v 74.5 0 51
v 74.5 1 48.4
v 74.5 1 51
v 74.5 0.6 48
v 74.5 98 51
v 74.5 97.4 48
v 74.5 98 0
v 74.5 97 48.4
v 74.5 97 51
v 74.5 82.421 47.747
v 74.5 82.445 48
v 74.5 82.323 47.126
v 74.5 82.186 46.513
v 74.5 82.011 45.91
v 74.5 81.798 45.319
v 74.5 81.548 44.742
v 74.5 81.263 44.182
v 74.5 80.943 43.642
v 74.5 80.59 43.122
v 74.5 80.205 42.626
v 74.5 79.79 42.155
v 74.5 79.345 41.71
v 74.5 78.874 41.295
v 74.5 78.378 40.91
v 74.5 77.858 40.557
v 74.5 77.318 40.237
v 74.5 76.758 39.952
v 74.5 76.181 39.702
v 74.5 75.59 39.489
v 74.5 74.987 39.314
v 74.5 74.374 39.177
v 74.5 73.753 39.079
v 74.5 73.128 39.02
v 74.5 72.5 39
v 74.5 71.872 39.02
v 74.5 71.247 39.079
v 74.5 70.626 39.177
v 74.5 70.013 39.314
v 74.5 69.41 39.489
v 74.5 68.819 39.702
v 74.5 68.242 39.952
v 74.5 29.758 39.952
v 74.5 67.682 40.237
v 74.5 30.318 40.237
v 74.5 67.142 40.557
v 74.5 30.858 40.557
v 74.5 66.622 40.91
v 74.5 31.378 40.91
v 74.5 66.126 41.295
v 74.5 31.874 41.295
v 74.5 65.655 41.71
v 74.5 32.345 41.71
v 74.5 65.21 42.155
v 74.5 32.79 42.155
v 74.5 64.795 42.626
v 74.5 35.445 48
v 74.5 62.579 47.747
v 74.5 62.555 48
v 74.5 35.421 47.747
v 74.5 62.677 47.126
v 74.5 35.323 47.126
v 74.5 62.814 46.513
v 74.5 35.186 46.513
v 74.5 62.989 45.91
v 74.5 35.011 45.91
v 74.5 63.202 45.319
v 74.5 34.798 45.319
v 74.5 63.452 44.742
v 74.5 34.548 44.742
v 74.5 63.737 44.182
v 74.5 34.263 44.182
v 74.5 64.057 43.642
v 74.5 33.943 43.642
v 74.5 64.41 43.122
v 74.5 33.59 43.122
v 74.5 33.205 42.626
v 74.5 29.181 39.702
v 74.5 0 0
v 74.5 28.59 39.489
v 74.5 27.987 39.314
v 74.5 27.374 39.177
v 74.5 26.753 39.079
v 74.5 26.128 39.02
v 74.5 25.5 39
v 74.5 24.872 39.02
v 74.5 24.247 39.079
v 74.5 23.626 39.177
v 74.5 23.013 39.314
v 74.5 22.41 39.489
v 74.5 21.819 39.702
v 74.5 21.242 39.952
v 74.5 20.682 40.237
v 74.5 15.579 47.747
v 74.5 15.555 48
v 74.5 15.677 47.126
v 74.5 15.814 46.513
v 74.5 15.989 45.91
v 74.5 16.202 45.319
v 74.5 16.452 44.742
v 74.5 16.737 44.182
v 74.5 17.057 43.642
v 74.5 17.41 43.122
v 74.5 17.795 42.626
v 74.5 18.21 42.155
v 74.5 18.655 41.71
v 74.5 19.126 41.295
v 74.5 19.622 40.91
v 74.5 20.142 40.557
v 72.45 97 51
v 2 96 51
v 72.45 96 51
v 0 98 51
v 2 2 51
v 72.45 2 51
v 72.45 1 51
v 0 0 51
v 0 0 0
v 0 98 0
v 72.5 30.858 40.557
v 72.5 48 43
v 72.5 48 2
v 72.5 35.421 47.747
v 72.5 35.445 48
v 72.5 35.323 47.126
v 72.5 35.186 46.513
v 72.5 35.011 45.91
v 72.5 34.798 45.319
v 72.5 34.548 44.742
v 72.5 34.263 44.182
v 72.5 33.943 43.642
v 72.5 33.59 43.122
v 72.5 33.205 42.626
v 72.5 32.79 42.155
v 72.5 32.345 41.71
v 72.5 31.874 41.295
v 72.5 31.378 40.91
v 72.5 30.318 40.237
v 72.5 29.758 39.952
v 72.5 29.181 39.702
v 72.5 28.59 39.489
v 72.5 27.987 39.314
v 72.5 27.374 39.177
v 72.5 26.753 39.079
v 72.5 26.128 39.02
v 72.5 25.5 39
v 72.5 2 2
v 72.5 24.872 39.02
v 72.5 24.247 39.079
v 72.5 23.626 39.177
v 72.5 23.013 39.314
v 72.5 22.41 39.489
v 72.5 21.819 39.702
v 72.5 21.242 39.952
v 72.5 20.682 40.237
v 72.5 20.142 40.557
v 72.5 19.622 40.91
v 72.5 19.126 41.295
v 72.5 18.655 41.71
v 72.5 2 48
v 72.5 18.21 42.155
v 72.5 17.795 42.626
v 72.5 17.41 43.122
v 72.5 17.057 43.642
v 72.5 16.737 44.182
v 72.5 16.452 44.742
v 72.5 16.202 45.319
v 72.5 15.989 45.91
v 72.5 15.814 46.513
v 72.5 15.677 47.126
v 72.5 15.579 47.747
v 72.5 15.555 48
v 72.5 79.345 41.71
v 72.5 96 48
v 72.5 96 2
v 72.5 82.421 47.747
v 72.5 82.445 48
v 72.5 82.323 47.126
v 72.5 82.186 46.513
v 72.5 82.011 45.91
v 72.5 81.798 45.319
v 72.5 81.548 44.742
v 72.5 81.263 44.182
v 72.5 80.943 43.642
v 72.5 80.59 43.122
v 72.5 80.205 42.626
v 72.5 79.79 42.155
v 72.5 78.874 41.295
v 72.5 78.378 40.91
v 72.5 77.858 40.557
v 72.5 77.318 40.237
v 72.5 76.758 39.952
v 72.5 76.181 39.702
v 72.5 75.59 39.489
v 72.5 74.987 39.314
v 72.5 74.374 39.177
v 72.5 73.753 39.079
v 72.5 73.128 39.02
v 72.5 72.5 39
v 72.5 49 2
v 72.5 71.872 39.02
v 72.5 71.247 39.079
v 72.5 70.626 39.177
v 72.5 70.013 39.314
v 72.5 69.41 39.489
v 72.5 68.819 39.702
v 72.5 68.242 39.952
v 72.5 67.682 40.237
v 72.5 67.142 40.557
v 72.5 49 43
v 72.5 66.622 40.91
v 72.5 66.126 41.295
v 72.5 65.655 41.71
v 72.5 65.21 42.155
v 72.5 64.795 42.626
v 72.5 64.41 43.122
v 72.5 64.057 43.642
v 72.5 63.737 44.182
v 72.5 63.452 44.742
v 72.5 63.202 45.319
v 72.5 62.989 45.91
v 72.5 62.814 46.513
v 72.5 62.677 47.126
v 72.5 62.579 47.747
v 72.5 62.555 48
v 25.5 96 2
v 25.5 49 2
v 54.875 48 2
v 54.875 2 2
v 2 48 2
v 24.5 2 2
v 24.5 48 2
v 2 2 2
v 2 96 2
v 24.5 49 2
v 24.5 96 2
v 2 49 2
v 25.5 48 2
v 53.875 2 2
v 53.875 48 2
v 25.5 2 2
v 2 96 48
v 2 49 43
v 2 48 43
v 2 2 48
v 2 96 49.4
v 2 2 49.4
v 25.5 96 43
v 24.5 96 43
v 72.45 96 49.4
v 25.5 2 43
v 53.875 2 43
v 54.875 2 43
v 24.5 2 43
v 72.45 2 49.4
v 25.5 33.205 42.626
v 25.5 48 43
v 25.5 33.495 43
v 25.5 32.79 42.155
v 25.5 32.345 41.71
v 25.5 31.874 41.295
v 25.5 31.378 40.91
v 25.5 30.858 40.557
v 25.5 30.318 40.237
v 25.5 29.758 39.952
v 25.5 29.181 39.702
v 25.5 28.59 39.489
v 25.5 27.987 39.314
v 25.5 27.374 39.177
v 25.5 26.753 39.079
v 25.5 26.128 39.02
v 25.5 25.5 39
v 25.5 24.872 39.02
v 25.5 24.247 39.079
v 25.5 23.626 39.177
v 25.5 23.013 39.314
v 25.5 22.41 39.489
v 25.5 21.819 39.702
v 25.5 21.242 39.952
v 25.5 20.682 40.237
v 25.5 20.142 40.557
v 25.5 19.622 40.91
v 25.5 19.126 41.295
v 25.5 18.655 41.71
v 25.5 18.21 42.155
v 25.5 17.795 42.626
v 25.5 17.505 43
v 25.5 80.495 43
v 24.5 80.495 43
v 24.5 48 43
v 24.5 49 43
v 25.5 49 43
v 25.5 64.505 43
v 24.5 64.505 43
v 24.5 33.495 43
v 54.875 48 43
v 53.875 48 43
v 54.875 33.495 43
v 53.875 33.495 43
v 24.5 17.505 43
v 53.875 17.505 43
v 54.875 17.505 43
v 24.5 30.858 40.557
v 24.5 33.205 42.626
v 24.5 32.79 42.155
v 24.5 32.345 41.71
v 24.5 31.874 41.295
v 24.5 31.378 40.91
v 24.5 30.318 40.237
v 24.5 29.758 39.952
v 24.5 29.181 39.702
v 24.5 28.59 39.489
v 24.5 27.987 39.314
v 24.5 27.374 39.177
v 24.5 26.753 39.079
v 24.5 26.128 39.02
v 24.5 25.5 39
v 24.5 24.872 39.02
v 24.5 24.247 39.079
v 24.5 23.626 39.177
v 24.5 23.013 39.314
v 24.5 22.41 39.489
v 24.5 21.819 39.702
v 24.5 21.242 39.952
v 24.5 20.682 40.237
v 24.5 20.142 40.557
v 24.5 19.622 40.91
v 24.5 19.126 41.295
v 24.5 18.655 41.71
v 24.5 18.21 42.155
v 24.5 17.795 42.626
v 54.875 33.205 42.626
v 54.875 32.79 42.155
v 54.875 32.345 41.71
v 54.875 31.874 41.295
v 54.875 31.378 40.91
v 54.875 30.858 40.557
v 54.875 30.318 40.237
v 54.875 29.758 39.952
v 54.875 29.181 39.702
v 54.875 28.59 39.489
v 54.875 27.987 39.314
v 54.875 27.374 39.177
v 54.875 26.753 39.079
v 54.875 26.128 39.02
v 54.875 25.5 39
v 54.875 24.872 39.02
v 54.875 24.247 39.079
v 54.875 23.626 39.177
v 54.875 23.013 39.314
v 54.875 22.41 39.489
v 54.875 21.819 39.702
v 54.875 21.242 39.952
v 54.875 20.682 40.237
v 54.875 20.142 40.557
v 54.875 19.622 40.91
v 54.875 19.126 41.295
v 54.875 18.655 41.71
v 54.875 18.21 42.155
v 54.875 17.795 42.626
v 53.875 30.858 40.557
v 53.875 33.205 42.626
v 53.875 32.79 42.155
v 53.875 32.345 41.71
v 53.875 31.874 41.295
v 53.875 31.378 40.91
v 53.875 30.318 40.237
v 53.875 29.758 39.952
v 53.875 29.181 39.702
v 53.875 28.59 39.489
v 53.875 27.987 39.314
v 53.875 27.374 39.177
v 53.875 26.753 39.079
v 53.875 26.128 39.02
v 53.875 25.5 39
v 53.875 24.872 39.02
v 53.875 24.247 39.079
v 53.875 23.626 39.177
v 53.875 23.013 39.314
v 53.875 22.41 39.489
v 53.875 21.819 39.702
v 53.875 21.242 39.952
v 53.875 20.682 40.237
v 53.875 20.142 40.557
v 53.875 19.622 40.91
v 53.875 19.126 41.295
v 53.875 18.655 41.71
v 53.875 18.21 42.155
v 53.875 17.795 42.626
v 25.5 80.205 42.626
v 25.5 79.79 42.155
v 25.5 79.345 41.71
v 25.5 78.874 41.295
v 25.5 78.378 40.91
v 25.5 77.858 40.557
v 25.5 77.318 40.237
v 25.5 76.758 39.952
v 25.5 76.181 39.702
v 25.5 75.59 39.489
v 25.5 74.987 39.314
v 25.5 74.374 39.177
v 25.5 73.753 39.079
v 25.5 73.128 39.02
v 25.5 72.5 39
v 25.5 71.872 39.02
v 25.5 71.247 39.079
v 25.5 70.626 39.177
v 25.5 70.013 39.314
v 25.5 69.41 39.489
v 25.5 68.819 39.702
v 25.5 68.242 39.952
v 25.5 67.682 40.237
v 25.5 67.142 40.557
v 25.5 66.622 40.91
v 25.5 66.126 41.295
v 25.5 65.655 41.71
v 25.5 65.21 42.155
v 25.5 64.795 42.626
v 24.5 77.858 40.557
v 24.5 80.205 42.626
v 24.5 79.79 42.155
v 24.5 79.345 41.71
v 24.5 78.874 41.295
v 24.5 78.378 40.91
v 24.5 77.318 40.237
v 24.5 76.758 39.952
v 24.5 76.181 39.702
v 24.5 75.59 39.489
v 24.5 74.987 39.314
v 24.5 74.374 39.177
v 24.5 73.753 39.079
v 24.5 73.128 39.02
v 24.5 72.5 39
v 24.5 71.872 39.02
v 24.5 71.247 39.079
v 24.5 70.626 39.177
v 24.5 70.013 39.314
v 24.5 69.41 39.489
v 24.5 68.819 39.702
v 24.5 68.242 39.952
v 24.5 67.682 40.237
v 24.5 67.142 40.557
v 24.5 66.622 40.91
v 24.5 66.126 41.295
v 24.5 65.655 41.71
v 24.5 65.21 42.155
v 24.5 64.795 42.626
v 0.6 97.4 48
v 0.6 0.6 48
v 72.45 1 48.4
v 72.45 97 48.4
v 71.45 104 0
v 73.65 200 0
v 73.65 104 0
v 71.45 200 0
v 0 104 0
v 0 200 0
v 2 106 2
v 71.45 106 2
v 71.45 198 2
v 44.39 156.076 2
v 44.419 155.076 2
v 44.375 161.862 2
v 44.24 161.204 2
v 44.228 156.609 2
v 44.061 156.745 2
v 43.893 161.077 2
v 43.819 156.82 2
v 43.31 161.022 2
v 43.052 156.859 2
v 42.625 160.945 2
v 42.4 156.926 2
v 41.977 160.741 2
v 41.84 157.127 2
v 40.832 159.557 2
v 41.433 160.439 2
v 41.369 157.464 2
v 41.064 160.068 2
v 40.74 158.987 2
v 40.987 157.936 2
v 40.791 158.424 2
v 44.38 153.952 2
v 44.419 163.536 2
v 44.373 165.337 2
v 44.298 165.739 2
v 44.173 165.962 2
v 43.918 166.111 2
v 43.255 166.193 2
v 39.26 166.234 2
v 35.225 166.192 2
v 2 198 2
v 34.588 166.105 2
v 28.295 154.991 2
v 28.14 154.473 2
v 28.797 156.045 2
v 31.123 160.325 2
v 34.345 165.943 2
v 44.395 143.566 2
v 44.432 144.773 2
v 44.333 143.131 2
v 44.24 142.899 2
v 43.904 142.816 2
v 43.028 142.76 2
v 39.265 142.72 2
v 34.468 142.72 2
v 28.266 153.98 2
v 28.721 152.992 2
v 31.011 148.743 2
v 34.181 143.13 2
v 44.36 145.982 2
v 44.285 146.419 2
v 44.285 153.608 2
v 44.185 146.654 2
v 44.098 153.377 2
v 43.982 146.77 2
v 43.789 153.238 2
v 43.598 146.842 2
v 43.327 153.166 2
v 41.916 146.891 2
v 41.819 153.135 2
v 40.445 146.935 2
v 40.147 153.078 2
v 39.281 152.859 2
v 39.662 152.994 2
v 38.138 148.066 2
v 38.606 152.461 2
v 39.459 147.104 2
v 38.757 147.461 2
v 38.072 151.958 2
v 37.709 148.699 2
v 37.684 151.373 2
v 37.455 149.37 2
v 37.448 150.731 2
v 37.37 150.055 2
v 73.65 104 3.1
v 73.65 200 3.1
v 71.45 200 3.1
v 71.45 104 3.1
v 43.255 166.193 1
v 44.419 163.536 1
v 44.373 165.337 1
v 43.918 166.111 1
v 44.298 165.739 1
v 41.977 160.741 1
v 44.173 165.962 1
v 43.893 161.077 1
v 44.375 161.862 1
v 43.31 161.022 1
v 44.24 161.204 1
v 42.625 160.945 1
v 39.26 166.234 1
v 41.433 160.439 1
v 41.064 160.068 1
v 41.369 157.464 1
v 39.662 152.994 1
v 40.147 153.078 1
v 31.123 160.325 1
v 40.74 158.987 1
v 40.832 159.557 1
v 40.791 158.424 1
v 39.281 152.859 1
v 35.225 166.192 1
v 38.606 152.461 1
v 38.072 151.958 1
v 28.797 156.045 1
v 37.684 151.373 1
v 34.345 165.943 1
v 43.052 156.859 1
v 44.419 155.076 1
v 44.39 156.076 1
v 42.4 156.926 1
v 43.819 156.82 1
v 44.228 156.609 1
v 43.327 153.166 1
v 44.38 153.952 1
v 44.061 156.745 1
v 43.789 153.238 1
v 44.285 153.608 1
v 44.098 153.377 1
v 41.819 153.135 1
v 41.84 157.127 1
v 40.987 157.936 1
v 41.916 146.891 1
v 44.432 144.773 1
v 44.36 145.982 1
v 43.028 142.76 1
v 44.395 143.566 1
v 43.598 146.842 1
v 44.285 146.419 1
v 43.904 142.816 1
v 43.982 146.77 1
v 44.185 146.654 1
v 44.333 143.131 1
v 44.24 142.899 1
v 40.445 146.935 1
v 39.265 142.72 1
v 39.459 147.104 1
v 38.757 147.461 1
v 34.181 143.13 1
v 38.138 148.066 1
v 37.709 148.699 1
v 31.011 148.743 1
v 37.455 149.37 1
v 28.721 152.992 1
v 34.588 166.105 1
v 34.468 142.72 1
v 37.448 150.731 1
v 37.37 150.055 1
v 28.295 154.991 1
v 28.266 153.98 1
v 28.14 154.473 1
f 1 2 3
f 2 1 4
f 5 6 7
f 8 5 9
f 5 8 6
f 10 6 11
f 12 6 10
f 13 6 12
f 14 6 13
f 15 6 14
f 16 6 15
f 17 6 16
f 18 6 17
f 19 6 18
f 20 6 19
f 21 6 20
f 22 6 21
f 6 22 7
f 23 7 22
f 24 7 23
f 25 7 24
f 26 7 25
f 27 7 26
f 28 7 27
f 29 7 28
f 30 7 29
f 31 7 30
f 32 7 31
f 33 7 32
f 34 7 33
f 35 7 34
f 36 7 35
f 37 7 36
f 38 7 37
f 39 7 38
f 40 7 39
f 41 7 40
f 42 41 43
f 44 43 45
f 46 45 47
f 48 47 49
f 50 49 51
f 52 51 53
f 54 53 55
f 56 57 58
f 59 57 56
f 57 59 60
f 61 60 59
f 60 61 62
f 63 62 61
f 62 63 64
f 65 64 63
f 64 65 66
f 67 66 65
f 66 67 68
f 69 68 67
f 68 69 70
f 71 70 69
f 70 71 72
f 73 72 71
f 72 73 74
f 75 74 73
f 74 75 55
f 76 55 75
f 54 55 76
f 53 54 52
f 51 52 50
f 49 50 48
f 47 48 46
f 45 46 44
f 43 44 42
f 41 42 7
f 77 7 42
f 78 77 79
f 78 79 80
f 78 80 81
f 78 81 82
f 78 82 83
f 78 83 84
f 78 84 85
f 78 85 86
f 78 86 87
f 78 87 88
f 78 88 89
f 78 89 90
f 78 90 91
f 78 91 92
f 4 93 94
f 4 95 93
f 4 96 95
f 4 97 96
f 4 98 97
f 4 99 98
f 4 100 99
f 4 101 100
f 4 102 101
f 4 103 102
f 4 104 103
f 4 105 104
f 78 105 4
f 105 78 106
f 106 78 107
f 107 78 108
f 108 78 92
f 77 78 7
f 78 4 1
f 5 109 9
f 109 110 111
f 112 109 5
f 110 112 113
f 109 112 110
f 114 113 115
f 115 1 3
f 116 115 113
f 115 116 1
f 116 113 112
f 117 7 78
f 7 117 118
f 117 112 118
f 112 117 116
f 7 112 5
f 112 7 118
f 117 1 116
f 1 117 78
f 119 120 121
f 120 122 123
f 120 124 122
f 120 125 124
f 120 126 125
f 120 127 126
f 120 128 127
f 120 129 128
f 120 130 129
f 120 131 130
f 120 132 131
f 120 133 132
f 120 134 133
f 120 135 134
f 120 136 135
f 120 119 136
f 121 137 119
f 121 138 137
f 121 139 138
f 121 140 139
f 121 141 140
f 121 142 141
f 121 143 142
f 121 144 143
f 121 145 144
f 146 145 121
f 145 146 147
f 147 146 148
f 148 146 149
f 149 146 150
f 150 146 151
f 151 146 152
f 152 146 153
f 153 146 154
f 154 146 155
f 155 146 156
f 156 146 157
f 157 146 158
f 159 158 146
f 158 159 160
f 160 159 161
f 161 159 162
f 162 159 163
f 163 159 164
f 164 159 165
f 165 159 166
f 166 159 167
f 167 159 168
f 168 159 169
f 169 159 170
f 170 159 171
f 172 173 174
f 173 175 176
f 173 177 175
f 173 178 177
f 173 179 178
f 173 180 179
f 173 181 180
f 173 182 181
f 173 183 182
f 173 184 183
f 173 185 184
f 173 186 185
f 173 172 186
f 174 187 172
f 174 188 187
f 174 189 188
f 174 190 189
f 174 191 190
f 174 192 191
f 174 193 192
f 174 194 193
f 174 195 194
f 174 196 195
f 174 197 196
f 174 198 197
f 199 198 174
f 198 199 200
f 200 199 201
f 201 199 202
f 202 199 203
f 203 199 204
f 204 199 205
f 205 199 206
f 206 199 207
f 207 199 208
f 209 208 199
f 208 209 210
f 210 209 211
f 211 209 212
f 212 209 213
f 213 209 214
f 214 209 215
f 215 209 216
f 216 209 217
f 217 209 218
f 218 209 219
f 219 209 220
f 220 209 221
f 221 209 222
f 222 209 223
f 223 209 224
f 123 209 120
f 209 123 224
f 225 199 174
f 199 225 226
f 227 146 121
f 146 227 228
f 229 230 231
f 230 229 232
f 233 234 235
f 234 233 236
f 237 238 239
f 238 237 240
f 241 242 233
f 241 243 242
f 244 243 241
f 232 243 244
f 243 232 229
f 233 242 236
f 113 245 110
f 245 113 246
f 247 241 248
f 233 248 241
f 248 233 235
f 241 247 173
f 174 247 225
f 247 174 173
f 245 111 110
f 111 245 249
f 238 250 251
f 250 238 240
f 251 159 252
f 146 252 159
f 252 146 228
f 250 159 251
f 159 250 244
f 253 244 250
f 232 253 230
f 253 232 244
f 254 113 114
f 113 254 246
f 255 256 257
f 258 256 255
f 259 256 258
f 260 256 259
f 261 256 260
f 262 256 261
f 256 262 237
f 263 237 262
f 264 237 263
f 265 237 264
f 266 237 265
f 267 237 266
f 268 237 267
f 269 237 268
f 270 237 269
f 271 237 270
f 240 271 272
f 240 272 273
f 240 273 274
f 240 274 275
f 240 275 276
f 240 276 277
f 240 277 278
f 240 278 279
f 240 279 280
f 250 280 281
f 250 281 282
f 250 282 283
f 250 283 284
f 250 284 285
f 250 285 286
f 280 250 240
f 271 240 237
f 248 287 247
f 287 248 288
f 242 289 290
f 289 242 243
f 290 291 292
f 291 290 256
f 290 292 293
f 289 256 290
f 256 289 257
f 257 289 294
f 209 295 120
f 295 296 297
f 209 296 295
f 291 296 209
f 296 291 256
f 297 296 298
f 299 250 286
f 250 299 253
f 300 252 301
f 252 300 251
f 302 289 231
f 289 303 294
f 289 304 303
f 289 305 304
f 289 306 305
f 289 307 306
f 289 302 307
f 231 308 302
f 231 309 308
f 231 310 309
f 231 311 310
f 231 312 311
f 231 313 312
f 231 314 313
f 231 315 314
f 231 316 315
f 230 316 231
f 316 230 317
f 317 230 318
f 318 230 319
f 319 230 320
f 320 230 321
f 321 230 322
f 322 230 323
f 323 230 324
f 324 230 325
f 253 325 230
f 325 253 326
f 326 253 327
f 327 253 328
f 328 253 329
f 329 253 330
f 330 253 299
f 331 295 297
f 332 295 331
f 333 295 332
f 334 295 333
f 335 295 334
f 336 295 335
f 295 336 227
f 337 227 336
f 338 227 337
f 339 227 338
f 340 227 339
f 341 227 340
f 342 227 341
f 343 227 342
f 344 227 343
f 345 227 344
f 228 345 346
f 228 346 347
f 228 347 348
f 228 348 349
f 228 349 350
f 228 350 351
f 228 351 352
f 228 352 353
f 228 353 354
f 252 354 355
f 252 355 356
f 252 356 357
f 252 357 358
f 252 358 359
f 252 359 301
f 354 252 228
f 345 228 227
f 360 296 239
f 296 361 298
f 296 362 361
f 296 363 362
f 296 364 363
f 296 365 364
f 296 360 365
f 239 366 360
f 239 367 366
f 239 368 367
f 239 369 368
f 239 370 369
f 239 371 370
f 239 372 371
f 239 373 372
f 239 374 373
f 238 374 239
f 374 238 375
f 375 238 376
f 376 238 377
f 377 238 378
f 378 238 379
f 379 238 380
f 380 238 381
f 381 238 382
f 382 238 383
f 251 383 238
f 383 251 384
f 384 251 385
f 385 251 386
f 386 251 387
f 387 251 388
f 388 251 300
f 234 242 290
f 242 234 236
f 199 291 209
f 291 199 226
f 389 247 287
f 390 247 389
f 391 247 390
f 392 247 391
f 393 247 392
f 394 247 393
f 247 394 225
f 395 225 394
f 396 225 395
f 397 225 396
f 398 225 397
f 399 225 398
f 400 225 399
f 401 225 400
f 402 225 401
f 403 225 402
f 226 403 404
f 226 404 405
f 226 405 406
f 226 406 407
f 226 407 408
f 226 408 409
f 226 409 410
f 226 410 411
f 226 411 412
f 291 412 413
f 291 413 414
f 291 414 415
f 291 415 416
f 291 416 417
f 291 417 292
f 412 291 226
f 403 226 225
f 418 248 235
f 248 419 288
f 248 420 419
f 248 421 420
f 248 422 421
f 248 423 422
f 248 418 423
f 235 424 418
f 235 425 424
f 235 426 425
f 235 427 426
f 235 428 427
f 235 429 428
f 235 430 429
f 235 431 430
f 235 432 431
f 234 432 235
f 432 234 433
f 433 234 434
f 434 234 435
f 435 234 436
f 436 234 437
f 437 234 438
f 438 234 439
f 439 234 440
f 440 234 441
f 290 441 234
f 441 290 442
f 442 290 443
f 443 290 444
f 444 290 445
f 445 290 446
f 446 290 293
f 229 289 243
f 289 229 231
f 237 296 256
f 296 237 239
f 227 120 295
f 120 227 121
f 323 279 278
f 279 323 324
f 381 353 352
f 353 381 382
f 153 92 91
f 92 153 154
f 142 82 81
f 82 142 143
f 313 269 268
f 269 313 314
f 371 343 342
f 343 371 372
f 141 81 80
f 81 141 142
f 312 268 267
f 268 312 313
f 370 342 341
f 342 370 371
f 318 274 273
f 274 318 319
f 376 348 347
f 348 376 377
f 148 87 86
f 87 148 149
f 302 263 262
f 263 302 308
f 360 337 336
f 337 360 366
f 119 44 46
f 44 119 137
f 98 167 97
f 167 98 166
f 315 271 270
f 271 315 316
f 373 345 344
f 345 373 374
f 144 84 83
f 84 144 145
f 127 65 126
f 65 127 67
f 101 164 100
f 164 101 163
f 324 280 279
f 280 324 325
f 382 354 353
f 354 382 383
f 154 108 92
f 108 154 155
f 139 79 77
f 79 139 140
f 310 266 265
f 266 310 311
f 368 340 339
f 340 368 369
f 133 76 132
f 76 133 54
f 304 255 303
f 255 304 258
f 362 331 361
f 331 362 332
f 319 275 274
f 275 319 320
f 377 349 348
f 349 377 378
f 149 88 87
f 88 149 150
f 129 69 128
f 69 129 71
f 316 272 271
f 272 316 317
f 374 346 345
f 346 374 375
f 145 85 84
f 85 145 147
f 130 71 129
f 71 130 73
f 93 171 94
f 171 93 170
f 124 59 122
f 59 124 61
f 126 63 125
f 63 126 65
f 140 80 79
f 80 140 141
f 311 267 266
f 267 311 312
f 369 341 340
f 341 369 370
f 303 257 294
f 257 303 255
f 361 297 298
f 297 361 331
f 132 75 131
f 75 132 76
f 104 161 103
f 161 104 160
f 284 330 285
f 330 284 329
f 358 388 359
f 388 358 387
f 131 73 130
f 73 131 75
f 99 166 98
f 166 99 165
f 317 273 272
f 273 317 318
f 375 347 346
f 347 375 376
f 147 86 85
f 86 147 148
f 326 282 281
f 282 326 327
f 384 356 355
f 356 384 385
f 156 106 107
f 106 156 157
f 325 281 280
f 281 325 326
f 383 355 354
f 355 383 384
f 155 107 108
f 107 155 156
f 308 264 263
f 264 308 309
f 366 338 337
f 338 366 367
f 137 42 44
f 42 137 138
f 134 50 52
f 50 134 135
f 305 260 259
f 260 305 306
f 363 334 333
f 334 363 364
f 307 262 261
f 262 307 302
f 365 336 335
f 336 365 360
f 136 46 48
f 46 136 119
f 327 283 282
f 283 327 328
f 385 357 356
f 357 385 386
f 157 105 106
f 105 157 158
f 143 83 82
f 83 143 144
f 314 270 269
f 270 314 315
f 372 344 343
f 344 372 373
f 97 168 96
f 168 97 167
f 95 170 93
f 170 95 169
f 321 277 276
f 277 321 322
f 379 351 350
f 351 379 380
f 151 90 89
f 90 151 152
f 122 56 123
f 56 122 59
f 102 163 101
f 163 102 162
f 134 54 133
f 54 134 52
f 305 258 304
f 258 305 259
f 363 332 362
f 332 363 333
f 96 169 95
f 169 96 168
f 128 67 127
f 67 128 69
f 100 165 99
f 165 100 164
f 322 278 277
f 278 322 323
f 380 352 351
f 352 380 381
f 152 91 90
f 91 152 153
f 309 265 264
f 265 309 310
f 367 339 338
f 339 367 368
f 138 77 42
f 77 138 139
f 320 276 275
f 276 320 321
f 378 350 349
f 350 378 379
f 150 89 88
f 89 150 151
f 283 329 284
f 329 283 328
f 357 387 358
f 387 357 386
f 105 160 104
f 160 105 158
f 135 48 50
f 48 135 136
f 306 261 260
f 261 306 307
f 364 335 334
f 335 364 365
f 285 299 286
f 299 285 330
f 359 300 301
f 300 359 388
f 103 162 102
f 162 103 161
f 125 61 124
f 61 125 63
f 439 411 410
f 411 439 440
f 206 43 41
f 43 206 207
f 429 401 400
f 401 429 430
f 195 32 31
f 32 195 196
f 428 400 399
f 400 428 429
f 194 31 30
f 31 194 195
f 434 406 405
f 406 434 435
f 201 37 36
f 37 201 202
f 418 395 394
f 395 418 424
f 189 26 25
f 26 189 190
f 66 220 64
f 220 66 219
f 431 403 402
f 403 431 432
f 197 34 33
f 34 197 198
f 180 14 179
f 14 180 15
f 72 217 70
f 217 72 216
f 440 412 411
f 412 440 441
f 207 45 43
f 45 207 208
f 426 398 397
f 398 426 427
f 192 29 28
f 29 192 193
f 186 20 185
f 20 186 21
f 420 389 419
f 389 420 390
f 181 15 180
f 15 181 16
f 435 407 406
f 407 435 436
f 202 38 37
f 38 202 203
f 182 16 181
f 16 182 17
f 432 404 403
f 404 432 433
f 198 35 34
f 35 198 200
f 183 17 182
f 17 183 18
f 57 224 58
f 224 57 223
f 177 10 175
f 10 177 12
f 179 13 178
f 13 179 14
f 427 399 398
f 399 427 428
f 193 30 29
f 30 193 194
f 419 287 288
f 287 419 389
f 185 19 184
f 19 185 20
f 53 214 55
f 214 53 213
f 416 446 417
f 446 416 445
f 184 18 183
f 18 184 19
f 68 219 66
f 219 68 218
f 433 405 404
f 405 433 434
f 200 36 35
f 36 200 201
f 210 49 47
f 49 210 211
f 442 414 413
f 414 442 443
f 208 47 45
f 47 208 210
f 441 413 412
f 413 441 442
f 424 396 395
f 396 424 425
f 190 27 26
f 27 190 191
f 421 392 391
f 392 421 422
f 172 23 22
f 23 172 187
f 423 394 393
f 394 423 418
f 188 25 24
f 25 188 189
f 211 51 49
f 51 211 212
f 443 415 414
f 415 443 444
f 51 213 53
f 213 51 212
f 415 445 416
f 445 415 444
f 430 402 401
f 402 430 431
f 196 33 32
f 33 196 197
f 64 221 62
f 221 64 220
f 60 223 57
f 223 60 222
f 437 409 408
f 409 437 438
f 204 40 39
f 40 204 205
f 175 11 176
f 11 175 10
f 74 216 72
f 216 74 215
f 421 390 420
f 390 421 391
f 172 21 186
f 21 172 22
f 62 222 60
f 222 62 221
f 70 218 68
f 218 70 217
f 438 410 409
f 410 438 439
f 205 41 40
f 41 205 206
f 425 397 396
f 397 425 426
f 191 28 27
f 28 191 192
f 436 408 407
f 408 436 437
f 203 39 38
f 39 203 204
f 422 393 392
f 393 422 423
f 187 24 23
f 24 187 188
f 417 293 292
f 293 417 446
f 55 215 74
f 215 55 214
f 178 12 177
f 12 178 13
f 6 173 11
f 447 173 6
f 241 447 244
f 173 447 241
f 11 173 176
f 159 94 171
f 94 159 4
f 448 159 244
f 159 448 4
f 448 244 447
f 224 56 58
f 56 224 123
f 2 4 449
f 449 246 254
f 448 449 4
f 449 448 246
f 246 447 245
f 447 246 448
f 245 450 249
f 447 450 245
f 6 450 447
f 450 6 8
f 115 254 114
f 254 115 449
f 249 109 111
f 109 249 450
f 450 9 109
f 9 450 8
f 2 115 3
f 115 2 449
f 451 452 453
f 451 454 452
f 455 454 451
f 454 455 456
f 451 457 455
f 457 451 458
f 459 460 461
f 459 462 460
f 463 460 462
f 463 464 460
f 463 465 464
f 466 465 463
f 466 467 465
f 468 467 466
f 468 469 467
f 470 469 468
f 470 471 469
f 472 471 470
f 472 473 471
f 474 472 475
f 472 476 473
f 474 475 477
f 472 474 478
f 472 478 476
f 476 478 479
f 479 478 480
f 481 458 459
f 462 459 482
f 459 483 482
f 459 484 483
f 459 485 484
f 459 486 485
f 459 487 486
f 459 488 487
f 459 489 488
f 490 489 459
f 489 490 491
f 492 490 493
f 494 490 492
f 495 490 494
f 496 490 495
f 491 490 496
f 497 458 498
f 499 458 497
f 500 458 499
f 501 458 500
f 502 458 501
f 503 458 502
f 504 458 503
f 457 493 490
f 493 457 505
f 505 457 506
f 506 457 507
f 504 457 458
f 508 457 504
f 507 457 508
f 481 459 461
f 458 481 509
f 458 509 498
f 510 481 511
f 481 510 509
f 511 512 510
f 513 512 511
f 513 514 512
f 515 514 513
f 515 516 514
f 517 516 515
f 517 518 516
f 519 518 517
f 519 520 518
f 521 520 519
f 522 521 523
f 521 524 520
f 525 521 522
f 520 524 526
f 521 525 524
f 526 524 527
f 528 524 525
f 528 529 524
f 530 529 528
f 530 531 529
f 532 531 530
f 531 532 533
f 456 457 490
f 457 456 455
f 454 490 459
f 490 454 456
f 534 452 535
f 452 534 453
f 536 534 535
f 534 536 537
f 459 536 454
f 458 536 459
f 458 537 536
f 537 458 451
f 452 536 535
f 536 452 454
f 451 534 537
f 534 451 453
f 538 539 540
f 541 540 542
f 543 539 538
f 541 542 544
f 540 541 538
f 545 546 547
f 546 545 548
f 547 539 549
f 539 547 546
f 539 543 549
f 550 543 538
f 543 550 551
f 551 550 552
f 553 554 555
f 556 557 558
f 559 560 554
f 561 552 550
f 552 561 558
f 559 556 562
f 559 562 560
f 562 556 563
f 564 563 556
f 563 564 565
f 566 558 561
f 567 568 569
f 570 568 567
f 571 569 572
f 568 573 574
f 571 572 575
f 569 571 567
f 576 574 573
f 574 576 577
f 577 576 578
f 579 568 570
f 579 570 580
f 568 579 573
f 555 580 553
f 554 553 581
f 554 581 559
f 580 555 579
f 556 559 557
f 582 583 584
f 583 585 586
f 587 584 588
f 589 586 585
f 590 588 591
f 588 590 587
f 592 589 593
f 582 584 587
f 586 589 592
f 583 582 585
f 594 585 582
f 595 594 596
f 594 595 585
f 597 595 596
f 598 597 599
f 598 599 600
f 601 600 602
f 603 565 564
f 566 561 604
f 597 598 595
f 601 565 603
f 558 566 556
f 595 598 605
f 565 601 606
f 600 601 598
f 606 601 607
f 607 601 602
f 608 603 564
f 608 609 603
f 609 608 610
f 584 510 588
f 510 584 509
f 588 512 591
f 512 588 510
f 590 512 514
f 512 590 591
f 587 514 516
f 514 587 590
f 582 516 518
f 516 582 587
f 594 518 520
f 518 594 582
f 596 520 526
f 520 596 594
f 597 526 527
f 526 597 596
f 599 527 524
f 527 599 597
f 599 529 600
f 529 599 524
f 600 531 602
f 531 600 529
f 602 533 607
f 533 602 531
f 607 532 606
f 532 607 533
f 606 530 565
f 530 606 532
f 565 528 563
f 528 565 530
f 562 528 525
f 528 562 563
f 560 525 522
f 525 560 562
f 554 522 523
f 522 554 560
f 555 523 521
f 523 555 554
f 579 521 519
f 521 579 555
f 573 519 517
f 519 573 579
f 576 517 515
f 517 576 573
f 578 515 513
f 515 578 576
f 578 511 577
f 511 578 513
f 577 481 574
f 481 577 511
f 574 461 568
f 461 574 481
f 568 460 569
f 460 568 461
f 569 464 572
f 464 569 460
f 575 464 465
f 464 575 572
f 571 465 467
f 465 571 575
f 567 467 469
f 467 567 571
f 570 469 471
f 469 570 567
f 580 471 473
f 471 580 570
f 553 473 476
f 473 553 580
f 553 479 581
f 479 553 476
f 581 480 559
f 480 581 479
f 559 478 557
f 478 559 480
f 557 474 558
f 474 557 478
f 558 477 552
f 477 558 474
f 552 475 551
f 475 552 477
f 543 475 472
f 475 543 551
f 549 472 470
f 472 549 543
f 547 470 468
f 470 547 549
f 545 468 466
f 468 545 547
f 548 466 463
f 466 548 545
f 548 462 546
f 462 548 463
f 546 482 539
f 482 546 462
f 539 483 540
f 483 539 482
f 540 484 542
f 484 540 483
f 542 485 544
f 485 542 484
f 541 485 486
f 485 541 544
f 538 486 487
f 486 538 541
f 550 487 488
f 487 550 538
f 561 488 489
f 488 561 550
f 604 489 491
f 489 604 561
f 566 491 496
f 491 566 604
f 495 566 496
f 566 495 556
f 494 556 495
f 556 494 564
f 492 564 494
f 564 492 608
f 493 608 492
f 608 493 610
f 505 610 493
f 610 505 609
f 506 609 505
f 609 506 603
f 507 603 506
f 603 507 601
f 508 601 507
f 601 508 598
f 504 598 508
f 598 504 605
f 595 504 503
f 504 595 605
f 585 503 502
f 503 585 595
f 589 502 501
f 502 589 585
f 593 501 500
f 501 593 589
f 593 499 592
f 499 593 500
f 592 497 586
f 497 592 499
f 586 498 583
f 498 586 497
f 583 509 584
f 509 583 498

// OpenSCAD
// file: carcassonne_box.scad
/**
 * @file carcassonne_box.scad
 * @author Conlan Wesson
 * Template for Carcossonne boxes.
 * @copyright Creative Commons Attribution-NonCommercial-ShareAlike 4.0
 */

mm = 1;
cm = 10*mm;

width = 47*mm;
thick = 2.5*mm;
wall = 2*mm;

/**
 * Lid for box.
 * @param count Number of cards.
 * @param columns Number of columns.
 * @param icon Path to icon DXF file.
 * @param rot Icon rotation in degrees.
 * @param mult Icon scale.
 * @param xoff X-offset of icon from center.
 * @param yoff Y-offset of icon from center.
 */
module carcassonne_lid(count, columns=1, icon=false, rot=0, mult=1, xoff=0, yoff=0, g=0){
	length = (thick * count) + ((width/2) - ((thick * count) % (width/2)));
	w = length+(1.5*wall)+.1;
	l = (width*columns)+wall;
	h = wall;
	d = 2;

	CubePoints = [
		[ 0-g, 0-g,   0 ],  //0
		[ w+g, 0-g,   0 ],  //1
		[ w+g, l+g,   0 ],  //2
		[ 0-g, l+g,   0 ],  //3
		[   d,   d, h+g ],  //4
		[   w,   d, h+g ],  //5
		[   w, l-d, h+g ],  //6
		[   d, l-d, h+g ]   //7
	];
	
	CubeFaces = [
		[0,1,2,3],  // bottom
		[4,5,1,0],  // front
		[7,6,5,4],  // top
		[5,6,2,1],  // right
		[6,7,3,2],  // back
		[7,4,0,3]   // left
	];
	
	
	difference(){
		union(){
			polyhedron( CubePoints, CubeFaces );
			translate([w-wall-.15,0,0]) cube([wall+.2,l, (1.5*wall)+.1]);
		}
		if(icon){
			translate([w/2+xoff,l/3+yoff,h-(wall/2)]){
				linear_extrude(height=(wall)+.1){
					rotate(rot) scale(mult) import(icon);
				}
			}
		}
	}
}

/**
 * Carcassonne card box.
 * @param count Number of cards.
 * @param dividers Array of divider positions.
 * @param columns Number of columns.
 */
module carcassonne_box(count, dividers=[], columns=1){
	length = (thick * count) + ((width/2) - ((thick * count) % (width/2)));
	difference(){
		union(){
			difference(){
				// Outer walls
				cube([length+(2*wall), (width*columns)+(2*wall), width+(2*wall)]);
				// Cavity
				translate([wall, wall, wall]){
					cube([length, width*columns, (width+wall)+.1]);
				}
			}
			// Dividers
			for(col = [0:columns-1]){
				for(div = dividers[col]){
					translate([(div*(width/2))+(wall/2), width*col+wall, 0]) cube([wall/2, width, width-(2*wall)]);
				}
				if(col > 0){
					translate([0, width*col+(wall/2), 0]) cube([length+(2*wall), wall/2, width-(2*wall)]);
				}
			}
		}
		union(){
			// Notch
			for(col = [0:columns-1]){
				translate([wall, wall+(width*col), wall]){
					translate([0, width/2, width])
					rotate([0, 90, 0]){
						cylinder(r=10, h=length+(2*wall), $fn=100);
					}
				}
			}
			// Track
			translate([wall/2,wall/2,width+wall/2]) carcassonne_lid(count, columns, g=0.4);
		}
	}
}
// main file
/**
 * @file abbeymayor.scad
 * @author Conlan Wesson
 * Abbey and Mayor Carcossonne box.
 * @copyright Creative Commons Attribution-NonCommercial-ShareAlike 4.0
 */

include <carcassonne_box.scad>

count = 24;
dividers = [[1,2.25],[1]];
columns = 2;

carcassonne_box(count, dividers, columns);
translate([0,width*columns+10,0]) carcassonne_lid(count, columns, icon="abbeymayor.dxf", rot=90, mult=0.07, xoff=10, yoff=3);
